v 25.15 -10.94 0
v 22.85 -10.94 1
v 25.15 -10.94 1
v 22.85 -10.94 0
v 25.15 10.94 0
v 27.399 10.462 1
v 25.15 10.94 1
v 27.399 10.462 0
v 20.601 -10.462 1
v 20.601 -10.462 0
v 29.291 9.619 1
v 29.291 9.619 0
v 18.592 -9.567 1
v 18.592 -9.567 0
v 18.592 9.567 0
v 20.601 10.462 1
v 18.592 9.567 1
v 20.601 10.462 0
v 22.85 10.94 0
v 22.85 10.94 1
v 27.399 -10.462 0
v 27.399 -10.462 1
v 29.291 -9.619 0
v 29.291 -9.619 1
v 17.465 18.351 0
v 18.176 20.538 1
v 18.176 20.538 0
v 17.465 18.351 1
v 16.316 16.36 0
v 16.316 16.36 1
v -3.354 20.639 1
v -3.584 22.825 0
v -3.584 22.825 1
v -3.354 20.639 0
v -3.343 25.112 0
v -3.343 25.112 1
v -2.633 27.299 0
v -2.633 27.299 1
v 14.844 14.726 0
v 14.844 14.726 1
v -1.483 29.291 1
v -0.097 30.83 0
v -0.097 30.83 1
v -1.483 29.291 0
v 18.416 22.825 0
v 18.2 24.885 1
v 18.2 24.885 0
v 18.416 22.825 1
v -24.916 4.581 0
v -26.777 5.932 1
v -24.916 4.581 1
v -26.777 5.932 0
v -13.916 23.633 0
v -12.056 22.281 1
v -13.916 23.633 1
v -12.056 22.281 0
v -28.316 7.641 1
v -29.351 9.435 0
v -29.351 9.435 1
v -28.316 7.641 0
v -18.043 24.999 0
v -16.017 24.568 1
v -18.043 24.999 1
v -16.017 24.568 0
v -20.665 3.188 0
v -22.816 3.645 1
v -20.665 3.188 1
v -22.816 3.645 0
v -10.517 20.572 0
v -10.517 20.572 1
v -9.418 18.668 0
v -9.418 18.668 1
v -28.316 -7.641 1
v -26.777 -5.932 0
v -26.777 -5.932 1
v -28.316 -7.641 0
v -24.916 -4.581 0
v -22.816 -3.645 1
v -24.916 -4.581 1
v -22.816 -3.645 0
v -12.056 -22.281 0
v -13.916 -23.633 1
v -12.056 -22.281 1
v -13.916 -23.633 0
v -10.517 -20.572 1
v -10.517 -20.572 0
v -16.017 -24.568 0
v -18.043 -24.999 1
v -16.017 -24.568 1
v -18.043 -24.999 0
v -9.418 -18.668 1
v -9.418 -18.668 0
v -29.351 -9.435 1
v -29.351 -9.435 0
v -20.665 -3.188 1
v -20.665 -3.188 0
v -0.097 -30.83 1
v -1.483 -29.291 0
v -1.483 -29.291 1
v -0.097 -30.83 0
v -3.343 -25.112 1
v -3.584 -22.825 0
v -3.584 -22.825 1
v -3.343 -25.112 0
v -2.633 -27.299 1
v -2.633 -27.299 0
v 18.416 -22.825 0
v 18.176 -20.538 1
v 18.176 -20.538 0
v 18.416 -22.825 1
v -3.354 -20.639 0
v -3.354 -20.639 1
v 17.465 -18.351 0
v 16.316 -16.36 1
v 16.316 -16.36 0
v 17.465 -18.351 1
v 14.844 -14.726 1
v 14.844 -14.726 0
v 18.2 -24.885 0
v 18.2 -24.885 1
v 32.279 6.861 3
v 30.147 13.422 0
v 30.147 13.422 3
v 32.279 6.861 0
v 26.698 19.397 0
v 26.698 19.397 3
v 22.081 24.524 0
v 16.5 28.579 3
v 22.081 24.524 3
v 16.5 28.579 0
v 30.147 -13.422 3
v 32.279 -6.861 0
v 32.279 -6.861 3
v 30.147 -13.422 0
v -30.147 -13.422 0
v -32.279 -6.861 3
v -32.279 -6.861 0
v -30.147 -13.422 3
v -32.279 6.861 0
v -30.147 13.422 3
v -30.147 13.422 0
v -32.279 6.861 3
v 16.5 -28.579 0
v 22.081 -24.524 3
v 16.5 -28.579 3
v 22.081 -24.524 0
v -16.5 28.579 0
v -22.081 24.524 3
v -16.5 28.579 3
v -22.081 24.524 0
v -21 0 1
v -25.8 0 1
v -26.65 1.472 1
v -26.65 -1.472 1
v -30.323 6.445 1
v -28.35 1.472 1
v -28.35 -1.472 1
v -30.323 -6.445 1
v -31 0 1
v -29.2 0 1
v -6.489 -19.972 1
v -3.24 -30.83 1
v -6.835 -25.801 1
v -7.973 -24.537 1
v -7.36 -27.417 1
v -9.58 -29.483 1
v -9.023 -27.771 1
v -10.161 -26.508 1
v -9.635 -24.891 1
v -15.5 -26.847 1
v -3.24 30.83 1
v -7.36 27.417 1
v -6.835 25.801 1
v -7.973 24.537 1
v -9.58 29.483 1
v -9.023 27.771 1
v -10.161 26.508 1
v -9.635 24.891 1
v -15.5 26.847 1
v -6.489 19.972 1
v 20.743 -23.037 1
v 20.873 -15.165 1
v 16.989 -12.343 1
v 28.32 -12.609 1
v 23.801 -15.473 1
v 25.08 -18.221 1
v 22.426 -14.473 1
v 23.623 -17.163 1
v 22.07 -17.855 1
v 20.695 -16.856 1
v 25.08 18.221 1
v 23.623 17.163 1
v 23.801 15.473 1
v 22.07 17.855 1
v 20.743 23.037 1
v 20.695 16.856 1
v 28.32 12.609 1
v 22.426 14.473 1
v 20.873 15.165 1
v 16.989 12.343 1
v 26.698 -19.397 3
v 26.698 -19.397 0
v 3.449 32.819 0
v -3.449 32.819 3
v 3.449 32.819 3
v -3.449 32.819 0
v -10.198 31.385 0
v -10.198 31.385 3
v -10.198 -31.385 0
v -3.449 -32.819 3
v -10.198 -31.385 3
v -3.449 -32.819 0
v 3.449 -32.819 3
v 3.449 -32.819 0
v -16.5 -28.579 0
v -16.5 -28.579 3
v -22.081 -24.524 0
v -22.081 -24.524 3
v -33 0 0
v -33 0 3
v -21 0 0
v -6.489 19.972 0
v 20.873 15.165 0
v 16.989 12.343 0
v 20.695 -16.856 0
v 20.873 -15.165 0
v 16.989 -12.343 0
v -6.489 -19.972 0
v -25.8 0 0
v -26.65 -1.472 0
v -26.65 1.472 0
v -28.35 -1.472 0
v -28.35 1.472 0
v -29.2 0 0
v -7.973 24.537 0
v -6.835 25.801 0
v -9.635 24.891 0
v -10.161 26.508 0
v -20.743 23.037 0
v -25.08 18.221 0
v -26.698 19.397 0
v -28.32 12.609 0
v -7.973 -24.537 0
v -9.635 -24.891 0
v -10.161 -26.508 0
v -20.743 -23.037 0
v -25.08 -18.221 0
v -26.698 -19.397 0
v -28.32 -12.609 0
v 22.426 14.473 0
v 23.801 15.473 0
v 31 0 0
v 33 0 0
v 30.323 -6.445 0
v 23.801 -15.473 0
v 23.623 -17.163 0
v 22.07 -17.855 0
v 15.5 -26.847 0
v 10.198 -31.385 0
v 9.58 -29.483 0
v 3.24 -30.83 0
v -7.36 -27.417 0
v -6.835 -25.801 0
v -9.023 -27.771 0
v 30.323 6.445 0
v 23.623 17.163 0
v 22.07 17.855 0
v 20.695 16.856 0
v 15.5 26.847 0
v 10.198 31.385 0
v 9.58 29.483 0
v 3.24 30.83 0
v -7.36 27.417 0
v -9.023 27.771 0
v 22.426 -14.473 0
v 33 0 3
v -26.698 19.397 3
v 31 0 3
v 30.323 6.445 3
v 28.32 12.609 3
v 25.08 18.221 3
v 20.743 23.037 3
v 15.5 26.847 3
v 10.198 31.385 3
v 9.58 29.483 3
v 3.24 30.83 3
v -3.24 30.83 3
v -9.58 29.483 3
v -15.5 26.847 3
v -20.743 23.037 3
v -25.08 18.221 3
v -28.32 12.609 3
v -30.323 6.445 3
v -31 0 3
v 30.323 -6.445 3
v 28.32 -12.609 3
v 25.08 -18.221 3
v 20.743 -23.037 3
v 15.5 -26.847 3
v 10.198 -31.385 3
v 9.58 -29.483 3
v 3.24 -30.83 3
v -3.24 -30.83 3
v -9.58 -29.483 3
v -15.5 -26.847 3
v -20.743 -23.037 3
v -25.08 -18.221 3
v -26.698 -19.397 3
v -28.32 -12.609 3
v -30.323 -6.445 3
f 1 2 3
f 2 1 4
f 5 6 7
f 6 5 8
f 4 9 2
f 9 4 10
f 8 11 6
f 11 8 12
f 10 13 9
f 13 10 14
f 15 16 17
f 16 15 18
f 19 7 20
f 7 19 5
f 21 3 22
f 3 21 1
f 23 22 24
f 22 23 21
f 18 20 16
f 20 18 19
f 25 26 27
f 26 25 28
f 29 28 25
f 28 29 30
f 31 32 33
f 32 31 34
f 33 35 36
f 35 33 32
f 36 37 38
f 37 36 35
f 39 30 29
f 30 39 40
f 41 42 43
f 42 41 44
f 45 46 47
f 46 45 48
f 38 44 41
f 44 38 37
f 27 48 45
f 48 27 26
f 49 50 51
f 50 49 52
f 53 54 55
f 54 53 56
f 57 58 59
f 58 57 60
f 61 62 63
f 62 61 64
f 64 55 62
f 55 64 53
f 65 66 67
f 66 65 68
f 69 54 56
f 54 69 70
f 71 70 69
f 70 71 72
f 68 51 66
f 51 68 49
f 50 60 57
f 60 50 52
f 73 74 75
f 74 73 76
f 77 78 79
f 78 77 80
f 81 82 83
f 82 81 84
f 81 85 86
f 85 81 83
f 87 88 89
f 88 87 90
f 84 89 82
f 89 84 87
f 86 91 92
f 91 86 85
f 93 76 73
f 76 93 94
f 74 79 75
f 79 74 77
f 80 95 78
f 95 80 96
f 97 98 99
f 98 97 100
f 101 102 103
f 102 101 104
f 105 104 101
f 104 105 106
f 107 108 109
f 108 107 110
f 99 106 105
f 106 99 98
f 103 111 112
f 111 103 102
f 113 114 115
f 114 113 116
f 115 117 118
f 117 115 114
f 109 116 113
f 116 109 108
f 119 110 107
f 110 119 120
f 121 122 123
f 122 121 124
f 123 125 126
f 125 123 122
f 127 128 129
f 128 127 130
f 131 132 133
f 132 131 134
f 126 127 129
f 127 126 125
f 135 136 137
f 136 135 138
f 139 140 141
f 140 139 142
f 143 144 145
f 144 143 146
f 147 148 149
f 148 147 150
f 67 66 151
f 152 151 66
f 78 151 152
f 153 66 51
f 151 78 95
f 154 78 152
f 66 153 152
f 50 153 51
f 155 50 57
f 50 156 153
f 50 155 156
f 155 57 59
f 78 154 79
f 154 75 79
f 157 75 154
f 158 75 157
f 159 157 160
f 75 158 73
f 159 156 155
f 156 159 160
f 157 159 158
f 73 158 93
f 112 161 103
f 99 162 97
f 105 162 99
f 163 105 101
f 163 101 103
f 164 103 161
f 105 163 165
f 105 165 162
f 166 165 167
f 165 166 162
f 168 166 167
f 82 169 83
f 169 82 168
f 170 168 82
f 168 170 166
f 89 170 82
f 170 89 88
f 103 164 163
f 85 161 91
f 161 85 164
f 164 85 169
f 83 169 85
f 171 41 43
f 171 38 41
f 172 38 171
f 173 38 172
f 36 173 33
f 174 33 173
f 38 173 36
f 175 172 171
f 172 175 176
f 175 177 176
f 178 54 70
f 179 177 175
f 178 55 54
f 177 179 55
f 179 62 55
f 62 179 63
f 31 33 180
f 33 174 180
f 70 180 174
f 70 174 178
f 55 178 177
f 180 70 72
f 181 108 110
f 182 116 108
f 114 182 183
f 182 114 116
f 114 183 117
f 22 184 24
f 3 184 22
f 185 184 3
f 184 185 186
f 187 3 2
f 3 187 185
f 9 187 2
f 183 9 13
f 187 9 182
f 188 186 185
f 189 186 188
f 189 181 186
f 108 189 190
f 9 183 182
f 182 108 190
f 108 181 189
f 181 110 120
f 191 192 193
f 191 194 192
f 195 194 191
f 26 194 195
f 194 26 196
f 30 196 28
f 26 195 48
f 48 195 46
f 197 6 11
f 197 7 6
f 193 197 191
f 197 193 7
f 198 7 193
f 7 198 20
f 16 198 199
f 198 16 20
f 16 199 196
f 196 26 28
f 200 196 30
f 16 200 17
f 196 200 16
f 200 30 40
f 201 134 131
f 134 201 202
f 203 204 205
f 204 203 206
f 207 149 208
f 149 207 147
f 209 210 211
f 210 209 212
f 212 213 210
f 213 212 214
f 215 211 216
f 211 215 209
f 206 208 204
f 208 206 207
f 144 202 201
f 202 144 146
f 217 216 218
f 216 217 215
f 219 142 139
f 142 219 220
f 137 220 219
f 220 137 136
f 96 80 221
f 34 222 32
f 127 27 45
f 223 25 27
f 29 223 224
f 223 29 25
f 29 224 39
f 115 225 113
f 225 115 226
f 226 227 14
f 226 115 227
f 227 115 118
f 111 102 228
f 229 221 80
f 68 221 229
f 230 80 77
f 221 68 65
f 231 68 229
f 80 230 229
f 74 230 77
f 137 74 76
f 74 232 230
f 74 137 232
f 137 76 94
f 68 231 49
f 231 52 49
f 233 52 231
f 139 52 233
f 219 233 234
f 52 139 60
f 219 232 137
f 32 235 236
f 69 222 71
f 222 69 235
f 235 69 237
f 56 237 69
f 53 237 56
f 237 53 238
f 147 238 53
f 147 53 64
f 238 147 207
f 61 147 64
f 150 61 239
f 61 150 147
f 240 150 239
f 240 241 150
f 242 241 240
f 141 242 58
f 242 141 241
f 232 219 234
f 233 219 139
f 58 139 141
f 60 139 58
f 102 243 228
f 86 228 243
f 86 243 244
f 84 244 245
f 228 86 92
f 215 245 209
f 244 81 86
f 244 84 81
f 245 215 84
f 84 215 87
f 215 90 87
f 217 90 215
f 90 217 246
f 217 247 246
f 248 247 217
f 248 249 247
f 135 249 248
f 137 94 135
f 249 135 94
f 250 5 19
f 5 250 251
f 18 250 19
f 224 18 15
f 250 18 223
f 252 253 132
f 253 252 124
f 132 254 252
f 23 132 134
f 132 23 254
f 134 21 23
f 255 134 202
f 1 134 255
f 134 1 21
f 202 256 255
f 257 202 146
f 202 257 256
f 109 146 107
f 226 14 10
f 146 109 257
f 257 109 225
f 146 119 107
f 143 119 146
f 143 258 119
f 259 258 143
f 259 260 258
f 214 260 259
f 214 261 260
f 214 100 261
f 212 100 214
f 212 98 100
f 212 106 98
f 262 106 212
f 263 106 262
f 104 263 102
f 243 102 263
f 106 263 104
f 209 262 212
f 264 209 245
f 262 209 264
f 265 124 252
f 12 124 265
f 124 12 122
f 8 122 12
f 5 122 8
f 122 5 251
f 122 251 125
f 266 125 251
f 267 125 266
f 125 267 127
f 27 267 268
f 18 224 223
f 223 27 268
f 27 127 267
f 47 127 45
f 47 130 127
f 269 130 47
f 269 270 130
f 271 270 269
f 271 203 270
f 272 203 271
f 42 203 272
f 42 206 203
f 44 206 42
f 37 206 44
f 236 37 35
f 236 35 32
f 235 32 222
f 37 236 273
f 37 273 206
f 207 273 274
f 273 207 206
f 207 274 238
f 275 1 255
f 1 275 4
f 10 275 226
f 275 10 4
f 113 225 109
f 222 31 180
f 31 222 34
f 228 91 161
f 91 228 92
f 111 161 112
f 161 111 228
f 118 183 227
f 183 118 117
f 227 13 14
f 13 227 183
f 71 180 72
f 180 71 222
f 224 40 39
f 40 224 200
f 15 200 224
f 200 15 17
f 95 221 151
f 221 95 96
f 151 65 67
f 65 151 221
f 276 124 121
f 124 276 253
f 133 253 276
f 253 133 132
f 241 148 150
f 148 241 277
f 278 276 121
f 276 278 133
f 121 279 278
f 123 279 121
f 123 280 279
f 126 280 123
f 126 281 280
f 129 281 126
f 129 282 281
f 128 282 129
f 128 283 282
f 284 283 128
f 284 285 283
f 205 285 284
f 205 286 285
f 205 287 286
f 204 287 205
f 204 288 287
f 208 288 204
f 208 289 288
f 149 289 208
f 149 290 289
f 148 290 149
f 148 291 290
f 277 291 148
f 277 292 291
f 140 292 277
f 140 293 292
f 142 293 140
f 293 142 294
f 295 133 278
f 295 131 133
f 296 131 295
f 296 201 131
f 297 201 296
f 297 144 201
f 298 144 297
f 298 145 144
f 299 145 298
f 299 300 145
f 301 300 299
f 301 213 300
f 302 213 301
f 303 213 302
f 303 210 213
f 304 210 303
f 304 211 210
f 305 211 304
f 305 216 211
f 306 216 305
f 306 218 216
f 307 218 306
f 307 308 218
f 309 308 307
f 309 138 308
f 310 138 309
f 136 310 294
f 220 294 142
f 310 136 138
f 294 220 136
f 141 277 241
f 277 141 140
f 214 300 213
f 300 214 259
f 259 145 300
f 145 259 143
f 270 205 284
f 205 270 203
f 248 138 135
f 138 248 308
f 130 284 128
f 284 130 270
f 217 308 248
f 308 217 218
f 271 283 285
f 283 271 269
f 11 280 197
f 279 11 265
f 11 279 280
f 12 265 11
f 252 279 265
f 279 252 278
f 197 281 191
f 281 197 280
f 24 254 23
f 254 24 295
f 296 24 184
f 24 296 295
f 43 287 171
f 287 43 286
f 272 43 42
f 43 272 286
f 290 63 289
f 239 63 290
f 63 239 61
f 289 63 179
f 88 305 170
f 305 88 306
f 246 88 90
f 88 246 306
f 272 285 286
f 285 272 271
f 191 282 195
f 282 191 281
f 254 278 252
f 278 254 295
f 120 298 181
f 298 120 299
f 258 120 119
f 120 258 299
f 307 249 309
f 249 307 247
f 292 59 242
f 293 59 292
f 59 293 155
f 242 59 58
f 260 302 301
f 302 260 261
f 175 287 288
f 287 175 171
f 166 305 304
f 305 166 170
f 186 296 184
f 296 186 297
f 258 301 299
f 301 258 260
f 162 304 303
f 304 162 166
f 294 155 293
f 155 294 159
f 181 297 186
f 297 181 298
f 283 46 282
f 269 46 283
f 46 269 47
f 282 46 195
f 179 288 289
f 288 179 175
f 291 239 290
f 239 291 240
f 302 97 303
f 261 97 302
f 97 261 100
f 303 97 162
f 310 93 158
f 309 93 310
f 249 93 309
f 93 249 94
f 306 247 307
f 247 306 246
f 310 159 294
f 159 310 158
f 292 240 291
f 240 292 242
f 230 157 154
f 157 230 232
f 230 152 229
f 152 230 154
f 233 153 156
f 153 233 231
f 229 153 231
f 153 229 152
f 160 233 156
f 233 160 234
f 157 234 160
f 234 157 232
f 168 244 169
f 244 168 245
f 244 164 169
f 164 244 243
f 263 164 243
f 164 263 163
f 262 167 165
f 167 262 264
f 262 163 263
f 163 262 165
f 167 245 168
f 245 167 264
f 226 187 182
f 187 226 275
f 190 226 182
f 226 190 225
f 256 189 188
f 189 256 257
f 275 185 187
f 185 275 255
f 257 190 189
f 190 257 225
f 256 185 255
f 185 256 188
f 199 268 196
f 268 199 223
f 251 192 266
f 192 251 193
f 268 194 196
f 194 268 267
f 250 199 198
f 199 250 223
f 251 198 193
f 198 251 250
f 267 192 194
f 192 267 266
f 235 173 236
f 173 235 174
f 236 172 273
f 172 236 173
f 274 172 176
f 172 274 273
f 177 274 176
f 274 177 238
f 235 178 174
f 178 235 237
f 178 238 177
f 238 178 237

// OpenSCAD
//$fa = 6;
//$fs = 0.4;

light_ring_spacer();

module light_ring_spacer(){
    difference() {
        union () {
            // gearbox lugs
            difference() {
                cylinder(d=66, h=1);
                for (i=[0:4]) {
                    rotate([0,0,i*72]) translate([24,0,-1]) cylinder(h=4, d=22);
                }
                translate([0,0,-1]) cylinder(d=42, h=7);
            }

            // Main Shell
            difference(){
                cylinder(d=66, h=3);
                translate([0,0,-1]) cylinder(d=62, h=5);
            }
        }

        for (i=[0:4]) {
            // outer mounting holes (far enough from edge and from upper nuts to not collide
            rotate([0,0,i*72]) translate([-27.5,0,-1]) cylinder(h=6, d=3.4);
        }
    }
}
